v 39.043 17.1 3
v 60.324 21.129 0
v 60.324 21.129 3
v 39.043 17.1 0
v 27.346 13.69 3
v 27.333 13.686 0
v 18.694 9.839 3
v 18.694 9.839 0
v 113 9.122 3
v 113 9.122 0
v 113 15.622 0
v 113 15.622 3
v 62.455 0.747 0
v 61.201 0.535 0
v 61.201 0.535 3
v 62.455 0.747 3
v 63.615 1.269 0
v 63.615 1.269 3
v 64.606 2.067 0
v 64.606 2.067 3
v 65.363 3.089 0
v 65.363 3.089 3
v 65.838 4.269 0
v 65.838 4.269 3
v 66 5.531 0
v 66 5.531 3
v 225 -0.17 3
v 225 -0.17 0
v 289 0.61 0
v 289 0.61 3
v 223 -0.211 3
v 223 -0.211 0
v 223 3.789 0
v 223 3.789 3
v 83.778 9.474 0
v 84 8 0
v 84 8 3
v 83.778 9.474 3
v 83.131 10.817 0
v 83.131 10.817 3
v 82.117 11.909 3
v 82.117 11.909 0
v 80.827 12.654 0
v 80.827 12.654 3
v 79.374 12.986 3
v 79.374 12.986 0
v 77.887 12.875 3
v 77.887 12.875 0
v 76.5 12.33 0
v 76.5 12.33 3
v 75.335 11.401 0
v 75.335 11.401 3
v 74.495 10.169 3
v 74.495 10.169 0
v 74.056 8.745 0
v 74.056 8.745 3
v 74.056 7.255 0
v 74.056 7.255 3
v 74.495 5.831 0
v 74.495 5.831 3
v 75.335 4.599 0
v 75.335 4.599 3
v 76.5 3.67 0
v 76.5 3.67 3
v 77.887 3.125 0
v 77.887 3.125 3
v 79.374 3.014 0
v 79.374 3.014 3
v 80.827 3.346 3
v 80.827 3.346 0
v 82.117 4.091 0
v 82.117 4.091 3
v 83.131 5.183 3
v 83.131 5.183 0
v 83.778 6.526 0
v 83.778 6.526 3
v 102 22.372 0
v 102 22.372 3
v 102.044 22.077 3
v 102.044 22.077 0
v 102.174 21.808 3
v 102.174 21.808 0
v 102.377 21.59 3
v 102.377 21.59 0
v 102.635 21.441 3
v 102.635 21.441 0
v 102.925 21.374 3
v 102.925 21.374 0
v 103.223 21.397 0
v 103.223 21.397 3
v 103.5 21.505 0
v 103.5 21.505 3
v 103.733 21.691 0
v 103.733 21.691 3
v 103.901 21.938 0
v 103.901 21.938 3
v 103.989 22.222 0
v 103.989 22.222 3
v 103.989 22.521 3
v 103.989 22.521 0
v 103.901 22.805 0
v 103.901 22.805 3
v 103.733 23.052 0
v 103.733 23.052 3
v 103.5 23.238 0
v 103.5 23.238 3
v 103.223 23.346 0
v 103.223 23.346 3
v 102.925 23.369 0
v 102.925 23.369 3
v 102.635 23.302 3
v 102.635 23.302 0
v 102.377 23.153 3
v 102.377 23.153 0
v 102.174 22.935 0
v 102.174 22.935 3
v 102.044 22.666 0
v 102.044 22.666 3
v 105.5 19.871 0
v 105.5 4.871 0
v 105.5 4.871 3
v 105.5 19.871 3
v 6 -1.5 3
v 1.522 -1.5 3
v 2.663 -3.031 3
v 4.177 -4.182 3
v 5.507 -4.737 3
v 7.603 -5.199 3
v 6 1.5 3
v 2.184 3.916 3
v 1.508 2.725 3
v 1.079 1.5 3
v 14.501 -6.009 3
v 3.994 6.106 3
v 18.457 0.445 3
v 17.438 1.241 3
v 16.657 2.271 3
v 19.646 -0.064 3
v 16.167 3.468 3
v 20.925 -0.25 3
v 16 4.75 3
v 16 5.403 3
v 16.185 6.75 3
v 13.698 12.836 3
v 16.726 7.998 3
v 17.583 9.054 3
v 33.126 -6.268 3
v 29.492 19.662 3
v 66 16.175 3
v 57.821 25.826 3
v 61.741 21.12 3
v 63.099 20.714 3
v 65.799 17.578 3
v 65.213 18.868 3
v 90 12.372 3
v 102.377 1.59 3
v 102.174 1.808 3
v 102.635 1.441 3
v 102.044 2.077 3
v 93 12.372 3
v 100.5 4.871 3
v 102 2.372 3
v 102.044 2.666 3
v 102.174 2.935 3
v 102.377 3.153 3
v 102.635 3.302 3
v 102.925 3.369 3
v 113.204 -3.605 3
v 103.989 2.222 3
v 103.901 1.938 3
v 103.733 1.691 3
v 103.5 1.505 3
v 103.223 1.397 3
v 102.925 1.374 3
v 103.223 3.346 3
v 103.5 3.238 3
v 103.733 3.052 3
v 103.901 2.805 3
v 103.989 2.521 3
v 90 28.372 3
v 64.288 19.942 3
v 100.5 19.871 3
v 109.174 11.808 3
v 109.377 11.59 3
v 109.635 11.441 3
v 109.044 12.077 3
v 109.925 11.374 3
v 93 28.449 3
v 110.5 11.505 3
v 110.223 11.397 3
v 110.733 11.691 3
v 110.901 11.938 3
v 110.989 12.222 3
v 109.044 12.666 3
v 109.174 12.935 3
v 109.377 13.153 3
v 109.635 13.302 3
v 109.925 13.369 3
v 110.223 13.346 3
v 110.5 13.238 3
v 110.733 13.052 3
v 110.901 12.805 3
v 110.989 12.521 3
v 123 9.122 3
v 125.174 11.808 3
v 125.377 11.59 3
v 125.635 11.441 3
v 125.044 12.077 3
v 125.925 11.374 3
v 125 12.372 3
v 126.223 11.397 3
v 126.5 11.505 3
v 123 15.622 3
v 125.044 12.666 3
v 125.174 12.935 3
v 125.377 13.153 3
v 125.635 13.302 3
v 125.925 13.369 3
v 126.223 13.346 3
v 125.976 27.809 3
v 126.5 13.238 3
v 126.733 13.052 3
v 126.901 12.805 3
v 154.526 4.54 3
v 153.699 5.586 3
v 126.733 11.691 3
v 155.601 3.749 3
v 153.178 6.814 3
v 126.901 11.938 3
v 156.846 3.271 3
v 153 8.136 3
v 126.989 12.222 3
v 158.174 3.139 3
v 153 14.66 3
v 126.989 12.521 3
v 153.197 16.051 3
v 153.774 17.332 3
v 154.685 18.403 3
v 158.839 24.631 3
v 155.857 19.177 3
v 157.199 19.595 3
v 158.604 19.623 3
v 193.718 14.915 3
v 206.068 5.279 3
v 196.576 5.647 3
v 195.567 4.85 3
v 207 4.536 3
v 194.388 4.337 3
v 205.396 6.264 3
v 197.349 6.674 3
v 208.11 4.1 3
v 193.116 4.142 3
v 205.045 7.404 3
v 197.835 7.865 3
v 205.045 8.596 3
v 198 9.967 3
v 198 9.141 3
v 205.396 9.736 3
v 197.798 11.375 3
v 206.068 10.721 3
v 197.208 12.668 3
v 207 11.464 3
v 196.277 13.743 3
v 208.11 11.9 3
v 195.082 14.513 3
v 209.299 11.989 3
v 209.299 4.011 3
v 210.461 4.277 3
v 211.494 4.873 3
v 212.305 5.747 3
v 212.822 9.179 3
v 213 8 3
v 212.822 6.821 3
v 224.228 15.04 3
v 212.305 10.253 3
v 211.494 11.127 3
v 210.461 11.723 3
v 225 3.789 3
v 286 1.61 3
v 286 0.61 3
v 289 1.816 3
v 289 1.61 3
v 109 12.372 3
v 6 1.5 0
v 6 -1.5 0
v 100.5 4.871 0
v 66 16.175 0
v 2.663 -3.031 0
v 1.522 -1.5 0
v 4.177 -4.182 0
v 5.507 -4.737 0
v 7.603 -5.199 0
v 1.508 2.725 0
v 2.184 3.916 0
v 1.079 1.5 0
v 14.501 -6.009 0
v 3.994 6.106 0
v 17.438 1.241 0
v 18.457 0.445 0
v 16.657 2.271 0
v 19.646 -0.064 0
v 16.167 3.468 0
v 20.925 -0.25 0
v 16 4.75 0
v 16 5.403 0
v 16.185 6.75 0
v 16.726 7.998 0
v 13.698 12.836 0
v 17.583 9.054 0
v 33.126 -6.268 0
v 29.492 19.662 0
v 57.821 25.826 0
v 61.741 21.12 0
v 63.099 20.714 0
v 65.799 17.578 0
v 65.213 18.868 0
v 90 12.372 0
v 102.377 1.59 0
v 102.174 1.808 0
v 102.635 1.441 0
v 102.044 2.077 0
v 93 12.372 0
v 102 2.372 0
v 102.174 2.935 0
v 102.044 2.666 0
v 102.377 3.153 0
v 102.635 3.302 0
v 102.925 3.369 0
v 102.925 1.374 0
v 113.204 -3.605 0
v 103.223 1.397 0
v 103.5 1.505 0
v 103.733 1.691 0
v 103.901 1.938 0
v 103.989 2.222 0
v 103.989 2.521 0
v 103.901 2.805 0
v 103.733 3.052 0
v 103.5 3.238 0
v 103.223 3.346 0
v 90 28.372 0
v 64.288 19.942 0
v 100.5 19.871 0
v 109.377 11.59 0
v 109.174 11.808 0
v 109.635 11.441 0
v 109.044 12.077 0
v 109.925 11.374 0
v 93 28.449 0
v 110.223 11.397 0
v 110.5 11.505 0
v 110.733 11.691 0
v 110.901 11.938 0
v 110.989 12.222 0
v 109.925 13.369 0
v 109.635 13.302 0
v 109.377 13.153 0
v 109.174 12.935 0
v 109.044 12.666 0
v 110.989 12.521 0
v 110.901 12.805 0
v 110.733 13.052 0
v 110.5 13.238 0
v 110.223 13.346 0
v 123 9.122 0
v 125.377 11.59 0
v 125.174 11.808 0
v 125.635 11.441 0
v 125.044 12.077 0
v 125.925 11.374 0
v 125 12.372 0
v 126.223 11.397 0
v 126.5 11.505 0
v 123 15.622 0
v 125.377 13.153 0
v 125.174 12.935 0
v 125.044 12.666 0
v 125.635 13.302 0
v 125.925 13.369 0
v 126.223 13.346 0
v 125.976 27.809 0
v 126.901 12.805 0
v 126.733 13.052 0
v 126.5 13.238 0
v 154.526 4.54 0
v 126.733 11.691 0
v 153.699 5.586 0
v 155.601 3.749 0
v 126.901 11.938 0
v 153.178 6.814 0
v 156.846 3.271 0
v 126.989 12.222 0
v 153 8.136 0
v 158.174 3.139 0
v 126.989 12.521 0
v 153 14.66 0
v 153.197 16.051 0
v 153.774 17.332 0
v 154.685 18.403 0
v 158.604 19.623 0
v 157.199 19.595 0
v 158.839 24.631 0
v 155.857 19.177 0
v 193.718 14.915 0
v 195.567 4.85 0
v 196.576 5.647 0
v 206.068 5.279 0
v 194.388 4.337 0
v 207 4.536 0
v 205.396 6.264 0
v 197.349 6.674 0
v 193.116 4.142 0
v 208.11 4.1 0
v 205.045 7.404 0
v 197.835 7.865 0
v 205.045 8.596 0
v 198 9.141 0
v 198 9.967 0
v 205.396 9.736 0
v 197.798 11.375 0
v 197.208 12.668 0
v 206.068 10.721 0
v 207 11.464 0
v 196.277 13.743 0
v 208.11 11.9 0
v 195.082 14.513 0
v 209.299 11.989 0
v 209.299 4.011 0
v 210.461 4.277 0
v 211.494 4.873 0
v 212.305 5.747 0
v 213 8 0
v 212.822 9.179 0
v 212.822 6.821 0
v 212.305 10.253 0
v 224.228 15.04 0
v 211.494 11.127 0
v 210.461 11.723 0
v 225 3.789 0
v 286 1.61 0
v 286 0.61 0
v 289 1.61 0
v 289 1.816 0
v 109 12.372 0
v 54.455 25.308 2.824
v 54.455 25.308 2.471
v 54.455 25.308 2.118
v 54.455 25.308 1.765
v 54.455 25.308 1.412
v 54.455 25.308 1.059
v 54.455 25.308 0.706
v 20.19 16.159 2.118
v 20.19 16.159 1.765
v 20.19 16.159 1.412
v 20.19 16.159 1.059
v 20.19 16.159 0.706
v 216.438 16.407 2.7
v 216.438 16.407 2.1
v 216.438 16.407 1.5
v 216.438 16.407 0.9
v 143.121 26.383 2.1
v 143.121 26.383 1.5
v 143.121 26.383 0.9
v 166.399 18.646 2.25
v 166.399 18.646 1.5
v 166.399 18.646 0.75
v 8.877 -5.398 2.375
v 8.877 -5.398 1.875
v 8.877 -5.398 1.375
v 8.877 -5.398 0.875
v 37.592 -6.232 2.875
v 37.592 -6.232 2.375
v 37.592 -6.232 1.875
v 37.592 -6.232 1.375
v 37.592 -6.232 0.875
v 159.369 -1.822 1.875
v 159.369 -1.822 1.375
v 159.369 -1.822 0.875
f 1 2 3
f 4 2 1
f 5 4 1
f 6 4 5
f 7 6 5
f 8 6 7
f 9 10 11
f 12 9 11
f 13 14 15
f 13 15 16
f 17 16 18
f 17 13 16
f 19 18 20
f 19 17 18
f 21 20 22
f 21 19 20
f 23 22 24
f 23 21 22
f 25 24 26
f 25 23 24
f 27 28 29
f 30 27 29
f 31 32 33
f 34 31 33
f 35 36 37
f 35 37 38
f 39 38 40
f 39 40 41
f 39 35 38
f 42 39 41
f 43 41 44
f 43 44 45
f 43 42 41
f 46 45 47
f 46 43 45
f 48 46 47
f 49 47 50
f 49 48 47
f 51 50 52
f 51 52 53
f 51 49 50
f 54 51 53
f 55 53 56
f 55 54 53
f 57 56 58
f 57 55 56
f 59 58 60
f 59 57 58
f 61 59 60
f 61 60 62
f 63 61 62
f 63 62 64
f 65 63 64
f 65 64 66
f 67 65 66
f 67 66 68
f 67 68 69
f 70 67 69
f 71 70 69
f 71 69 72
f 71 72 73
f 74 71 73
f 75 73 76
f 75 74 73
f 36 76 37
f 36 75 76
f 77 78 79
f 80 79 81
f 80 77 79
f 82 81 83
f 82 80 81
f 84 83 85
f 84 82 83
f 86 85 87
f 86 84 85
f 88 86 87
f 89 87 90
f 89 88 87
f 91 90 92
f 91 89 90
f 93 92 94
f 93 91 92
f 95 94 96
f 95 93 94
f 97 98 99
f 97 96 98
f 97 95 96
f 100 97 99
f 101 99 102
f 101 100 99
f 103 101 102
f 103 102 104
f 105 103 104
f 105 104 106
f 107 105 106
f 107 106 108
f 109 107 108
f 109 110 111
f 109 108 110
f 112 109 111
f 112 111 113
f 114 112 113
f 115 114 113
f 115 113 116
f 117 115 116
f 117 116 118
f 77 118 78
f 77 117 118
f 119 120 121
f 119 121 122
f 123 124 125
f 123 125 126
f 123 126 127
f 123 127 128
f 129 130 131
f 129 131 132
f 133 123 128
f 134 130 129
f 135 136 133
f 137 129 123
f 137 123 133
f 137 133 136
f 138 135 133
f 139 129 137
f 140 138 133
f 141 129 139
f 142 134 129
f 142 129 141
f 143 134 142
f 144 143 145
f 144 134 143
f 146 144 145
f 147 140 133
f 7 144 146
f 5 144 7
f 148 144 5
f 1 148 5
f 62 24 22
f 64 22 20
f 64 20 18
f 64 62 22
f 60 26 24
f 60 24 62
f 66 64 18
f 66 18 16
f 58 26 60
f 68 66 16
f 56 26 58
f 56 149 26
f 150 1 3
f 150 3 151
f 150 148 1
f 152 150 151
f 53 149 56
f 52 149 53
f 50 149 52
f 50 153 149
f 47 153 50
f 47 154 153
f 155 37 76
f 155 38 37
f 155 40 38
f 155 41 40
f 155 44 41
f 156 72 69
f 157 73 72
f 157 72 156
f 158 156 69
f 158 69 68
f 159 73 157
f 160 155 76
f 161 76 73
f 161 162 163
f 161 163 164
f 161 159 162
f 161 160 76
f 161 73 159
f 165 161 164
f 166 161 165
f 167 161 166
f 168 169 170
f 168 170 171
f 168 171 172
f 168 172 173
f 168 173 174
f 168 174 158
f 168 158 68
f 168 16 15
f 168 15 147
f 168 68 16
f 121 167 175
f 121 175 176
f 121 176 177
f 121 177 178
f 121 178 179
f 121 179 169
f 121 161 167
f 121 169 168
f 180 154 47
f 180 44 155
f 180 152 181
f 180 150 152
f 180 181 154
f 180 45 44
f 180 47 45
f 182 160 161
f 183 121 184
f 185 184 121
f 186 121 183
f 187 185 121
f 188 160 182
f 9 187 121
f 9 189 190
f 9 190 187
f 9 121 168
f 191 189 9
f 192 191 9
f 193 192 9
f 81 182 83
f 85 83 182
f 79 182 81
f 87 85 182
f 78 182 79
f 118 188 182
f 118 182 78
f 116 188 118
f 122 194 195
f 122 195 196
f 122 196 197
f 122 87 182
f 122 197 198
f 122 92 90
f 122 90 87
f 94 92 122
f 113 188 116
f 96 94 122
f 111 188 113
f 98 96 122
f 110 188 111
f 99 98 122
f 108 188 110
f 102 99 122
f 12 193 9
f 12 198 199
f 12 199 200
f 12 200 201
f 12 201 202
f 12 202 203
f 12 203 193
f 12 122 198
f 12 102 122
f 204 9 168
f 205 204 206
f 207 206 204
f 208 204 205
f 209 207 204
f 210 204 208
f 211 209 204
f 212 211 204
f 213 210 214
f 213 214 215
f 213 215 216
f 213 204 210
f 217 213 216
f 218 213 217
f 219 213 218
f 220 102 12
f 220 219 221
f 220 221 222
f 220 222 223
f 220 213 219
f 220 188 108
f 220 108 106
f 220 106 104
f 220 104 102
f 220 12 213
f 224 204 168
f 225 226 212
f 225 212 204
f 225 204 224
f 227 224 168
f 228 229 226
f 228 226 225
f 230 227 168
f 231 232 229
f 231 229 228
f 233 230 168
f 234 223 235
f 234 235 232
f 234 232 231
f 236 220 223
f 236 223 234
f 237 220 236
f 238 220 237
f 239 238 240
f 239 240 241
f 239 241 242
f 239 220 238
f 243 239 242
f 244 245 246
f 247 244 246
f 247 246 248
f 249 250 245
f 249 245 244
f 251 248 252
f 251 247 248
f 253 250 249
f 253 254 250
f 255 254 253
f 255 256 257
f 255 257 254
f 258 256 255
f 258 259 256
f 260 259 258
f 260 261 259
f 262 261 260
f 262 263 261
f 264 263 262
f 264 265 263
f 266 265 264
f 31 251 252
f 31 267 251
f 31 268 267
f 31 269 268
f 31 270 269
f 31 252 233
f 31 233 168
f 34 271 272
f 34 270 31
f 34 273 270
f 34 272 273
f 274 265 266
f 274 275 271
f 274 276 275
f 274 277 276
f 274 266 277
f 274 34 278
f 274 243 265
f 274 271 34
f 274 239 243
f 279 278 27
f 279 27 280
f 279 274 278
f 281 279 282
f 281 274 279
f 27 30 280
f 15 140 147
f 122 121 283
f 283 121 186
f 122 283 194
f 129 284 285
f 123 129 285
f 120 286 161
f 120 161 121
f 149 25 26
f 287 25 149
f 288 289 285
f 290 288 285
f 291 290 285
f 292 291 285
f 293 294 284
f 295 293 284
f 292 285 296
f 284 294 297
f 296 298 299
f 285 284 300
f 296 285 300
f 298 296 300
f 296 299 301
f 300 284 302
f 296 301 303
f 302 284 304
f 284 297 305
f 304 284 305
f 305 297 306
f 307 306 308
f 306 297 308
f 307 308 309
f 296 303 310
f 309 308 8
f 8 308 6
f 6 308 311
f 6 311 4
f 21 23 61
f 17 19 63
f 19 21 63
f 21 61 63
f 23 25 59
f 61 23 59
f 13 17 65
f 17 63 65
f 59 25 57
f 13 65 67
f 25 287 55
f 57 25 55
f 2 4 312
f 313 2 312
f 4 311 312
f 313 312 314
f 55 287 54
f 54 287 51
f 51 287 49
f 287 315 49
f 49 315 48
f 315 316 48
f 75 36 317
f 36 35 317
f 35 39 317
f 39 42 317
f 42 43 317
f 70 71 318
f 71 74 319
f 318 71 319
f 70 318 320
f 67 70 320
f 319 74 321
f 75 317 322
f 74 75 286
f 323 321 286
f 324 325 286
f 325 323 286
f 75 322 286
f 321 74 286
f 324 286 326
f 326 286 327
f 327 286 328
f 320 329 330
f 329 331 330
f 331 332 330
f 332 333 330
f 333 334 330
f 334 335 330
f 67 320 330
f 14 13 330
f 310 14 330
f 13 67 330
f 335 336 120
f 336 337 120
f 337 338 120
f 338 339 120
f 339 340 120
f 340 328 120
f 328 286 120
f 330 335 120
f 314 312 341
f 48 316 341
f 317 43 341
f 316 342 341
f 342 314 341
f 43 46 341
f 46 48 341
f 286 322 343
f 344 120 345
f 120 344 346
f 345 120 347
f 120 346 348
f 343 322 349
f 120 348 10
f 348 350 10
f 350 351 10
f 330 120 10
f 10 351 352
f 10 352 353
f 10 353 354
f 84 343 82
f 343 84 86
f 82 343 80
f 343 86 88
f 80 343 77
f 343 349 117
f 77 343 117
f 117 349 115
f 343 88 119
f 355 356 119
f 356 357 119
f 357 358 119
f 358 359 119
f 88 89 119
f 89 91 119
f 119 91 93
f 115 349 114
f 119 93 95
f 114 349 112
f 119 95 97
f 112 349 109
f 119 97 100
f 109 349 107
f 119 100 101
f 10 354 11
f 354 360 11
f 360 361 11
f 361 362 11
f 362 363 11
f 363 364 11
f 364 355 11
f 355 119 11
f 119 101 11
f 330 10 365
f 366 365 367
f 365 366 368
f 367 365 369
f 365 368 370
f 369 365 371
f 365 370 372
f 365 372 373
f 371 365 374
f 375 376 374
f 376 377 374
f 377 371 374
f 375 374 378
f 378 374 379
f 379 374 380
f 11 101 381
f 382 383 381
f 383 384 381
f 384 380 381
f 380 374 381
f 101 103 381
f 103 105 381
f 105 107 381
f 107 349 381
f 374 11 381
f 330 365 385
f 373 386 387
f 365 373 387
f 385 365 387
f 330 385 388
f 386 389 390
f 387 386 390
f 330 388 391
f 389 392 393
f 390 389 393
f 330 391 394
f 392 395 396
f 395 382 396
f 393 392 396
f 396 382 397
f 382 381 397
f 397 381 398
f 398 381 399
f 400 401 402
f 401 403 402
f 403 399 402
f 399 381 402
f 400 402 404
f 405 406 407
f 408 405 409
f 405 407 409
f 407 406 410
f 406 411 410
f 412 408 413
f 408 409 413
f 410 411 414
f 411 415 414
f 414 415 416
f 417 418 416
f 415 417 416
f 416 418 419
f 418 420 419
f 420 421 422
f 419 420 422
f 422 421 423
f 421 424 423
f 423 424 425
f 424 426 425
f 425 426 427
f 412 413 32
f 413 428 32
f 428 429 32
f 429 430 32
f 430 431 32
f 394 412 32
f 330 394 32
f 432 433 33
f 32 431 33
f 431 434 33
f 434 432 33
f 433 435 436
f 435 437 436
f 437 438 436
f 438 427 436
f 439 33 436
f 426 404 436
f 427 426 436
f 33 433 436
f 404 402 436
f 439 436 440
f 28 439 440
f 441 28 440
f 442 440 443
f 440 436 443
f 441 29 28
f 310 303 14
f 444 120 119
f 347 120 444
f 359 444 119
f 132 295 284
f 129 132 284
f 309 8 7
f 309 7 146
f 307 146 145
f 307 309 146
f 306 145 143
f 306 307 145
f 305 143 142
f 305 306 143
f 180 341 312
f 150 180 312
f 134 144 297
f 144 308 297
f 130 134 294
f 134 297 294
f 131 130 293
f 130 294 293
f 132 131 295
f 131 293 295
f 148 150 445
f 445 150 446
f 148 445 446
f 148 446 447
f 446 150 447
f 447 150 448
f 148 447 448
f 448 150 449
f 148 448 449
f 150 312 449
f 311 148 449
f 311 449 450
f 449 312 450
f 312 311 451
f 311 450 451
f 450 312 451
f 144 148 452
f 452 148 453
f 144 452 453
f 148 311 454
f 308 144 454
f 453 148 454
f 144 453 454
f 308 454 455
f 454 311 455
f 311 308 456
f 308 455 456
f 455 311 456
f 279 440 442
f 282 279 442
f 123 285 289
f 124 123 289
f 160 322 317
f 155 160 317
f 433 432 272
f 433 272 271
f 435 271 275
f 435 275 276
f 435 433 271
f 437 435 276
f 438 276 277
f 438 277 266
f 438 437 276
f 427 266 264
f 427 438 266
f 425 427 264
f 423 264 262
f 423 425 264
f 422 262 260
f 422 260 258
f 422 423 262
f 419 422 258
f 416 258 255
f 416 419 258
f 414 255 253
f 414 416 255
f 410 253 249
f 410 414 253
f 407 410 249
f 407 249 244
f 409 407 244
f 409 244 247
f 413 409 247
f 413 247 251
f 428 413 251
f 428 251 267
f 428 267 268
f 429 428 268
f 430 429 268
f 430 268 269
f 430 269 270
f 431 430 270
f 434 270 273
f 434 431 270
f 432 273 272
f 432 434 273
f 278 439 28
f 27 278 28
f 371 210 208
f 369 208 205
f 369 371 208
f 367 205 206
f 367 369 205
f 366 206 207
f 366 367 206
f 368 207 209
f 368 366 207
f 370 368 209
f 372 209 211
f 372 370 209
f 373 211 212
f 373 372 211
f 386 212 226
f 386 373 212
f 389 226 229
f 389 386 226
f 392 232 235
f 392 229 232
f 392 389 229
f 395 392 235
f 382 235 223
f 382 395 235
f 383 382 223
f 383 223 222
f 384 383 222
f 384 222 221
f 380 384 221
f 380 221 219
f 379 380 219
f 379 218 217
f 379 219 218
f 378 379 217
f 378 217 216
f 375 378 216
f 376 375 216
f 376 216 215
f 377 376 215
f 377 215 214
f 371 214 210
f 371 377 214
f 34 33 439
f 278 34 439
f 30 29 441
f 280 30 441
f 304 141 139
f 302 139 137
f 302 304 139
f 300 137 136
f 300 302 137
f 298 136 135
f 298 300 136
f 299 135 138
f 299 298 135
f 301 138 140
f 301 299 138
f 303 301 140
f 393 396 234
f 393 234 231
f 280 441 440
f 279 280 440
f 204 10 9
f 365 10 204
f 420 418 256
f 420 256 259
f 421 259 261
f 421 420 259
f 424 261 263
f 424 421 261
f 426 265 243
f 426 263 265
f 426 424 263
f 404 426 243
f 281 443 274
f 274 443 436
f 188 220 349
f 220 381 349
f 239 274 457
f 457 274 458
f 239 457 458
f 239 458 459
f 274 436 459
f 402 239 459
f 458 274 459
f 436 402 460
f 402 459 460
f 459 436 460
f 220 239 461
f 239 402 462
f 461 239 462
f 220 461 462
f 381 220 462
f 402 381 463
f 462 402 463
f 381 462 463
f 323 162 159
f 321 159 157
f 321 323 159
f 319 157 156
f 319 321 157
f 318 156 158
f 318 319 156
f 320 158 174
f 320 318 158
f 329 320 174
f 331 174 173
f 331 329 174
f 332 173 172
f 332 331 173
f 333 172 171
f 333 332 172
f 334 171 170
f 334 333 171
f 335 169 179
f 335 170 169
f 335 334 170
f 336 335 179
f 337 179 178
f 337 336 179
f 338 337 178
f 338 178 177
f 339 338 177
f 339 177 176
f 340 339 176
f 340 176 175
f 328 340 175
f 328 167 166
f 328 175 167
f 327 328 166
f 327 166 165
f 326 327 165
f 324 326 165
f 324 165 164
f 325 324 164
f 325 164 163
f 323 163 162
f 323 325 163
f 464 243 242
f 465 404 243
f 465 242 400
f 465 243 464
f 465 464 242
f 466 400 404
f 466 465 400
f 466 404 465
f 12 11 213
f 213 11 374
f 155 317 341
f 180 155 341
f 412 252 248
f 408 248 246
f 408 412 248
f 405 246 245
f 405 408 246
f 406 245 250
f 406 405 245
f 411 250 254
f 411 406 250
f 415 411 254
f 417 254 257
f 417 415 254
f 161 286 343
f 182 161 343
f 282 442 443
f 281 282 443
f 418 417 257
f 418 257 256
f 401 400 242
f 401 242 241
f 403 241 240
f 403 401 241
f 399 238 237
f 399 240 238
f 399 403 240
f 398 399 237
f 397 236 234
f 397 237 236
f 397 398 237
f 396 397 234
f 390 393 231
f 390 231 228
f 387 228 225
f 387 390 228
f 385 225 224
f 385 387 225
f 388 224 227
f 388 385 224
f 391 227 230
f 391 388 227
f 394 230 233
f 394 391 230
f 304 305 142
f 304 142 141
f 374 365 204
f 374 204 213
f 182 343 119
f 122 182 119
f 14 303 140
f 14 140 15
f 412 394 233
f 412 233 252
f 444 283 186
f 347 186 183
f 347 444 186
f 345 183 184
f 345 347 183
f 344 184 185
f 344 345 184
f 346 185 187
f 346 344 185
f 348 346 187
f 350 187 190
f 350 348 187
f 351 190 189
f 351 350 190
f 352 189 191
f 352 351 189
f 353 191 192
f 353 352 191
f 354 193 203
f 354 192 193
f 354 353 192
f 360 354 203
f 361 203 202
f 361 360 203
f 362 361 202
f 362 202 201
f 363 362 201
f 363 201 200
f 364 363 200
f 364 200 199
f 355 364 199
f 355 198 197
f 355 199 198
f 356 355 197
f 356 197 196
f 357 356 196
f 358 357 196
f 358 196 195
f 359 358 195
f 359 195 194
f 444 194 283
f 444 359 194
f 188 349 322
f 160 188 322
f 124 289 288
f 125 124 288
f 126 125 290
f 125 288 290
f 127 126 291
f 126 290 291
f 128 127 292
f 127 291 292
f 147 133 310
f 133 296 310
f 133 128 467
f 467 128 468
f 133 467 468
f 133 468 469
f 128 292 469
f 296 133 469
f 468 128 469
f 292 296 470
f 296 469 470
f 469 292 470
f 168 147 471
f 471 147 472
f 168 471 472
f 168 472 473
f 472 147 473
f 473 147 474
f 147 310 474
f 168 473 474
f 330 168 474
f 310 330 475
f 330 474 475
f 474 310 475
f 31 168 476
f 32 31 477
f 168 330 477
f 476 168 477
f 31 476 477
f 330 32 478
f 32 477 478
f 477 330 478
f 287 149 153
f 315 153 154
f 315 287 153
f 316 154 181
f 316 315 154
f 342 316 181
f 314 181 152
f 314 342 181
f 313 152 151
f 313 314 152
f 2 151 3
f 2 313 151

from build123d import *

# Parameters (mm, degrees)
SKETCH_1_R          = 5
SKETCH_1_R_2        = 4
EXTRUDE_1_DEPTH     = 3
SKETCH_3_R          = 1
SKETCH_3_W          = 10
SKETCH_3_H          = 6.5
SKETCH_3_W_2        = 5
SKETCH_3_H_2        = 15
CUT_EXTRUDE_2_DEPTH = 291.422386836


with BuildPart() as part:
    # 草图1 → 凸台-拉伸1 (new body)
    with BuildSketch(Plane.XY):
        with BuildLine():
            Line((90, 12.3715), (90, 28.372426217))
            add(Edge.make_bspline(
                [(90, 28.372426217), (89.259446982, 28.350928743), (82.363996343, 28.13322439), (72.403347361, 27.586524792), (60.185862052, 26.226268085), (51.080991088, 24.79810862), (42.033943524, 23.000087944), (34.581994337, 21.174922903), (28.697351661, 19.44563851), (24.361981086, 17.983441115), (20.174828998, 16.207949367), (16.078941989, 14.139912989), (12.040296713, 11.946766626), (8.14011433, 9.56039573), (5.153679337, 7.316395724), (3.100060439, 5.200618052), (1.813825976, 3.470730924), (1.237398467, 2.180506339), (1.085380705, 1.529058937), (1.078882286, 1.5)],
                knots=[0.345773533, 0.345773533, 0.345773533, 0.345773533, 0.349398211, 0.379527288, 0.394591827, 0.409656366, 0.424720905, 0.439785444, 0.447317713, 0.454849983, 0.462382252, 0.469914522, 0.477446791, 0.484979061, 0.49251133, 0.496277465, 0.5000436, 0.503809734, 0.503985678, 0.503985678, 0.503985678, 0.503985678], degree=3))
            Line((1.078882286, 1.5), (6, 1.5))
            Line((6, 1.5), (6, -1.5))
            Line((6, -1.5), (1.522379628, -1.5))
            add(Edge.make_bspline(
                [(1.522379628, -1.5), (1.617903461, -1.678770523), (2.068186491, -2.42442122), (3.143139608, -3.601090845), (4.854253, -4.619355756), (6.927567017, -5.105597911), (9.209034621, -5.454839075), (12.219971865, -5.84289763), (16.020132359, -6.14266222), (20.609524976, -6.2611368), (25.231457517, -6.286948592), (31.397380169, -6.280305851), (39.107274969, -6.240736398), (48.336813051, -6.022096429), (57.579935967, -5.612990736), (66.840654471, -5.242934226), (76.096556555, -4.921715721), (88.435998513, -4.515955408), (103.853120896, -3.973102953), (122.354625015, -3.248110744), (140.857835973, -2.495489966), (159.368527813, -1.804089638), (177.884173919, -1.222493213), (196.4033921, -0.774877257), (211.439290174, -0.454334834), (220.305576898, -0.265987383), (223, -0.210849605)],
                knots=[0.510182255, 0.510182255, 0.510182255, 0.510182255, 0.511342004, 0.515108139, 0.518874273, 0.522640408, 0.526406543, 0.530172677, 0.537704947, 0.545237216, 0.552769486, 0.560301755, 0.575366294, 0.590430833, 0.605495372, 0.620559911, 0.63562445, 0.650688989, 0.680818067, 0.710947144, 0.741076222, 0.7712053, 0.801334378, 0.831463456, 0.861592533, 0.874744372, 0.874744372, 0.874744372, 0.874744372], degree=3))
            Line((223, -0.210849605), (223, 3.788737263))
            Line((223, 3.788737263), (225, 3.788737263))
            Line((225, 3.788737263), (225, -0.170338801))
            add(Edge.make_bspline(
                [(225, -0.170338801), (227.811595191, -0.114017747), (236.796798206, 0.056910764), (251.961175933, 0.256656825), (270.471854229, 0.429163033), (282.824771355, 0.587434741), (289, 0.610062865)],
                knots=[0.877998396, 0.877998396, 0.877998396, 0.877998396, 0.891721611, 0.921850689, 0.951979767, 0.982108845, 0.982108845, 0.982108845, 0.982108845], degree=3))
            Line((289, 0.610062865), (286, 0.610062865))
            Line((286, 0.610062865), (286, 1.610062865))
            Line((286, 1.610062865), (289, 1.610062865))
            Line((289, 1.610062865), (289, 1.816246039))
            add(Edge.make_bspline(
                [(289, 1.816246039), (276.957314444, 4.502285023), (258.861554155, 8.397620333), (234.648247971, 13.152786595), (216.448478593, 16.478914183), (198.182873559, 19.371550405), (179.850571346, 21.924148488), (161.503162682, 24.358614825), (143.127892269, 26.473190985), (124.712239059, 28.043780086), (107.994173705, 28.616385423), (97.416270032, 28.546670082), (93, 28.44913561)],
                knots=[0.017978355, 0.017978355, 0.017978355, 0.017978355, 0.07823651, 0.108365588, 0.138494666, 0.168623744, 0.198752821, 0.228881899, 0.259010977, 0.289140055, 0.319269133, 0.340879606, 0.340879606, 0.340879606, 0.340879606], degree=3))
            Line((93, 28.44913561), (93, 12.3715))
            Line((93, 12.3715), (90, 12.3715))
        make_face()
        with Locations((79, 8)):
            Circle(SKETCH_1_R, mode=Mode.SUBTRACT)
        with Locations((209, 8)):
            Circle(SKETCH_1_R_2, mode=Mode.SUBTRACT)
    extrude(amount=EXTRUDE_1_DEPTH)

    # 草图3 → 切除-拉伸2 (cut, through all)
    with BuildSketch(Plane.XY):
        with Locations(Location((110, 12.3715, 0), (0, 0, 180))):
            Circle(SKETCH_3_R)
        with Locations(Location((126, 12.3715, 0), (0, 0, 180))):
            Circle(SKETCH_3_R)
        with Locations(Location((103, 22.3715, 0), (0, 0, 180))):
            Circle(SKETCH_3_R)
        with Locations(Location((103, 2.3715, 0), (0, 0, 180))):
            Circle(SKETCH_3_R)
        with BuildLine():
            Line((16, 5.402967421), (16, 4.74959002))
            ThreePointArc((16, 4.74959002), (17.438137187, 1.240582567), (20.925253321, -0.249851242))
            add(Edge.make_bspline(
                [(20.925253321, -0.249851242), (22.914045789, -0.279585692), (24.903284625, -0.283778057), (29.14616948, -0.28369414), (31.399982567, -0.278002295), (38.161511328, -0.238823637), (42.669255398, -0.168803371), (51.680216376, 0.117967683), (56.183014764, 0.33147635), (60.85831542, 0.520784363), (61.02954636, 0.527691534), (61.200778311, 0.534573017)],
                knots=[0.014317915, 0.014317915, 0.014317915, 0.014317915, 0.020284927, 0.020284927, 0.027046569, 0.027046569, 0.040569854, 0.040569854, 0.054093138, 0.054093138, 0.054607249, 0.054607249, 0.054607249, 0.054607249], degree=3))
            ThreePointArc((61.200778311, 0.534573017), (64.605821096, 2.066719442), (66, 5.530540197))
            Line((66, 5.530540197), (66, 16.175207171))
            ThreePointArc((66, 16.175207171), (64.287676463, 19.942325894), (60.32352661, 21.129234195))
            add(Edge.make_bspline(
                [(60.32352661, 21.129234195), (59.143282742, 20.968071656), (57.964431768, 20.796736398), (53.109249428, 20.046773379), (49.445857595, 19.384253181), (42.158673028, 17.868714577), (38.533379611, 17.019586343), (33.148990447, 15.546220745), (31.362942012, 15.022439399), (27.821005995, 13.880218625), (26.067238608, 13.253271835), (22.635818059, 11.812670552), (20.957942753, 11.004847704), (19.099592195, 10.049689097), (18.896441621, 9.944700093), (18.693547477, 9.839213217)],
                knots=[0.029920383, 0.029920383, 0.029920383, 0.029920383, 0.033494004, 0.033494004, 0.044658672, 0.044658672, 0.05582334, 0.05582334, 0.061405674, 0.061405674, 0.066988008, 0.066988008, 0.072570342, 0.072570342, 0.073256353, 0.073256353, 0.073256353, 0.073256353], degree=3))
            ThreePointArc((18.693547477, 9.839213217), (16.726110517, 7.997937304), (16, 5.402967421))
        make_face()
        with Locations((118, 12.3715)):
            Rectangle(SKETCH_3_W, SKETCH_3_H)
        with Locations((103, 12.3715)):
            Rectangle(SKETCH_3_W_2, SKETCH_3_H_2)
        with BuildLine():
            Line((153, 14.659796962), (153, 8.136010376))
            ThreePointArc((153, 8.136010376), (154.52636013, 4.539647484), (158.17353042, 3.139022564))
            add(Edge.make_bspline(
                [(158.17353042, 3.139022564), (161.058246521, 3.239200114), (163.943505856, 3.335590583), (171.504636491, 3.576232826), (176.18199895, 3.713351663), (184.945921303, 3.946800138), (189.03214497, 4.046860263), (193.116453453, 4.14201244)],
                knots=[0.711426146, 0.711426146, 0.711426146, 0.711426146, 0.75, 0.75, 0.8125, 0.8125, 0.867133534, 0.867133534, 0.867133534, 0.867133534], degree=3))
            ThreePointArc((193.116453453, 4.14201244), (196.576469437, 5.64653729), (198, 9.140656115))
            Line((198, 9.140656115), (198, 9.967295711))
            ThreePointArc((198, 9.967295711), (196.781019979, 13.238975389), (193.718444833, 14.915410202))
            add(Edge.make_bspline(
                [(193.718444833, 14.915410202), (192.779013077, 15.051811632), (191.839123333, 15.187073825), (186.824226186, 15.902901834), (182.740892869, 16.465870736), (174.565909682, 17.575800313), (170.481299177, 18.120965891), (163.799588722, 18.980812945), (161.201113289, 19.307400191), (158.603501679, 19.623241907)],
                knots=[0.485575284, 0.485575284, 0.485575284, 0.485575284, 0.5, 0.5, 0.5625, 0.5625, 0.625, 0.625, 0.664795718, 0.664795718, 0.664795718, 0.664795718], degree=3))
            ThreePointArc((158.603501679, 19.623241907), (154.684695217, 18.402623995), (153, 14.659796962))
        make_face()
    extrude(amount=CUT_EXTRUDE_2_DEPTH, mode=Mode.SUBTRACT)


solid = part.part
